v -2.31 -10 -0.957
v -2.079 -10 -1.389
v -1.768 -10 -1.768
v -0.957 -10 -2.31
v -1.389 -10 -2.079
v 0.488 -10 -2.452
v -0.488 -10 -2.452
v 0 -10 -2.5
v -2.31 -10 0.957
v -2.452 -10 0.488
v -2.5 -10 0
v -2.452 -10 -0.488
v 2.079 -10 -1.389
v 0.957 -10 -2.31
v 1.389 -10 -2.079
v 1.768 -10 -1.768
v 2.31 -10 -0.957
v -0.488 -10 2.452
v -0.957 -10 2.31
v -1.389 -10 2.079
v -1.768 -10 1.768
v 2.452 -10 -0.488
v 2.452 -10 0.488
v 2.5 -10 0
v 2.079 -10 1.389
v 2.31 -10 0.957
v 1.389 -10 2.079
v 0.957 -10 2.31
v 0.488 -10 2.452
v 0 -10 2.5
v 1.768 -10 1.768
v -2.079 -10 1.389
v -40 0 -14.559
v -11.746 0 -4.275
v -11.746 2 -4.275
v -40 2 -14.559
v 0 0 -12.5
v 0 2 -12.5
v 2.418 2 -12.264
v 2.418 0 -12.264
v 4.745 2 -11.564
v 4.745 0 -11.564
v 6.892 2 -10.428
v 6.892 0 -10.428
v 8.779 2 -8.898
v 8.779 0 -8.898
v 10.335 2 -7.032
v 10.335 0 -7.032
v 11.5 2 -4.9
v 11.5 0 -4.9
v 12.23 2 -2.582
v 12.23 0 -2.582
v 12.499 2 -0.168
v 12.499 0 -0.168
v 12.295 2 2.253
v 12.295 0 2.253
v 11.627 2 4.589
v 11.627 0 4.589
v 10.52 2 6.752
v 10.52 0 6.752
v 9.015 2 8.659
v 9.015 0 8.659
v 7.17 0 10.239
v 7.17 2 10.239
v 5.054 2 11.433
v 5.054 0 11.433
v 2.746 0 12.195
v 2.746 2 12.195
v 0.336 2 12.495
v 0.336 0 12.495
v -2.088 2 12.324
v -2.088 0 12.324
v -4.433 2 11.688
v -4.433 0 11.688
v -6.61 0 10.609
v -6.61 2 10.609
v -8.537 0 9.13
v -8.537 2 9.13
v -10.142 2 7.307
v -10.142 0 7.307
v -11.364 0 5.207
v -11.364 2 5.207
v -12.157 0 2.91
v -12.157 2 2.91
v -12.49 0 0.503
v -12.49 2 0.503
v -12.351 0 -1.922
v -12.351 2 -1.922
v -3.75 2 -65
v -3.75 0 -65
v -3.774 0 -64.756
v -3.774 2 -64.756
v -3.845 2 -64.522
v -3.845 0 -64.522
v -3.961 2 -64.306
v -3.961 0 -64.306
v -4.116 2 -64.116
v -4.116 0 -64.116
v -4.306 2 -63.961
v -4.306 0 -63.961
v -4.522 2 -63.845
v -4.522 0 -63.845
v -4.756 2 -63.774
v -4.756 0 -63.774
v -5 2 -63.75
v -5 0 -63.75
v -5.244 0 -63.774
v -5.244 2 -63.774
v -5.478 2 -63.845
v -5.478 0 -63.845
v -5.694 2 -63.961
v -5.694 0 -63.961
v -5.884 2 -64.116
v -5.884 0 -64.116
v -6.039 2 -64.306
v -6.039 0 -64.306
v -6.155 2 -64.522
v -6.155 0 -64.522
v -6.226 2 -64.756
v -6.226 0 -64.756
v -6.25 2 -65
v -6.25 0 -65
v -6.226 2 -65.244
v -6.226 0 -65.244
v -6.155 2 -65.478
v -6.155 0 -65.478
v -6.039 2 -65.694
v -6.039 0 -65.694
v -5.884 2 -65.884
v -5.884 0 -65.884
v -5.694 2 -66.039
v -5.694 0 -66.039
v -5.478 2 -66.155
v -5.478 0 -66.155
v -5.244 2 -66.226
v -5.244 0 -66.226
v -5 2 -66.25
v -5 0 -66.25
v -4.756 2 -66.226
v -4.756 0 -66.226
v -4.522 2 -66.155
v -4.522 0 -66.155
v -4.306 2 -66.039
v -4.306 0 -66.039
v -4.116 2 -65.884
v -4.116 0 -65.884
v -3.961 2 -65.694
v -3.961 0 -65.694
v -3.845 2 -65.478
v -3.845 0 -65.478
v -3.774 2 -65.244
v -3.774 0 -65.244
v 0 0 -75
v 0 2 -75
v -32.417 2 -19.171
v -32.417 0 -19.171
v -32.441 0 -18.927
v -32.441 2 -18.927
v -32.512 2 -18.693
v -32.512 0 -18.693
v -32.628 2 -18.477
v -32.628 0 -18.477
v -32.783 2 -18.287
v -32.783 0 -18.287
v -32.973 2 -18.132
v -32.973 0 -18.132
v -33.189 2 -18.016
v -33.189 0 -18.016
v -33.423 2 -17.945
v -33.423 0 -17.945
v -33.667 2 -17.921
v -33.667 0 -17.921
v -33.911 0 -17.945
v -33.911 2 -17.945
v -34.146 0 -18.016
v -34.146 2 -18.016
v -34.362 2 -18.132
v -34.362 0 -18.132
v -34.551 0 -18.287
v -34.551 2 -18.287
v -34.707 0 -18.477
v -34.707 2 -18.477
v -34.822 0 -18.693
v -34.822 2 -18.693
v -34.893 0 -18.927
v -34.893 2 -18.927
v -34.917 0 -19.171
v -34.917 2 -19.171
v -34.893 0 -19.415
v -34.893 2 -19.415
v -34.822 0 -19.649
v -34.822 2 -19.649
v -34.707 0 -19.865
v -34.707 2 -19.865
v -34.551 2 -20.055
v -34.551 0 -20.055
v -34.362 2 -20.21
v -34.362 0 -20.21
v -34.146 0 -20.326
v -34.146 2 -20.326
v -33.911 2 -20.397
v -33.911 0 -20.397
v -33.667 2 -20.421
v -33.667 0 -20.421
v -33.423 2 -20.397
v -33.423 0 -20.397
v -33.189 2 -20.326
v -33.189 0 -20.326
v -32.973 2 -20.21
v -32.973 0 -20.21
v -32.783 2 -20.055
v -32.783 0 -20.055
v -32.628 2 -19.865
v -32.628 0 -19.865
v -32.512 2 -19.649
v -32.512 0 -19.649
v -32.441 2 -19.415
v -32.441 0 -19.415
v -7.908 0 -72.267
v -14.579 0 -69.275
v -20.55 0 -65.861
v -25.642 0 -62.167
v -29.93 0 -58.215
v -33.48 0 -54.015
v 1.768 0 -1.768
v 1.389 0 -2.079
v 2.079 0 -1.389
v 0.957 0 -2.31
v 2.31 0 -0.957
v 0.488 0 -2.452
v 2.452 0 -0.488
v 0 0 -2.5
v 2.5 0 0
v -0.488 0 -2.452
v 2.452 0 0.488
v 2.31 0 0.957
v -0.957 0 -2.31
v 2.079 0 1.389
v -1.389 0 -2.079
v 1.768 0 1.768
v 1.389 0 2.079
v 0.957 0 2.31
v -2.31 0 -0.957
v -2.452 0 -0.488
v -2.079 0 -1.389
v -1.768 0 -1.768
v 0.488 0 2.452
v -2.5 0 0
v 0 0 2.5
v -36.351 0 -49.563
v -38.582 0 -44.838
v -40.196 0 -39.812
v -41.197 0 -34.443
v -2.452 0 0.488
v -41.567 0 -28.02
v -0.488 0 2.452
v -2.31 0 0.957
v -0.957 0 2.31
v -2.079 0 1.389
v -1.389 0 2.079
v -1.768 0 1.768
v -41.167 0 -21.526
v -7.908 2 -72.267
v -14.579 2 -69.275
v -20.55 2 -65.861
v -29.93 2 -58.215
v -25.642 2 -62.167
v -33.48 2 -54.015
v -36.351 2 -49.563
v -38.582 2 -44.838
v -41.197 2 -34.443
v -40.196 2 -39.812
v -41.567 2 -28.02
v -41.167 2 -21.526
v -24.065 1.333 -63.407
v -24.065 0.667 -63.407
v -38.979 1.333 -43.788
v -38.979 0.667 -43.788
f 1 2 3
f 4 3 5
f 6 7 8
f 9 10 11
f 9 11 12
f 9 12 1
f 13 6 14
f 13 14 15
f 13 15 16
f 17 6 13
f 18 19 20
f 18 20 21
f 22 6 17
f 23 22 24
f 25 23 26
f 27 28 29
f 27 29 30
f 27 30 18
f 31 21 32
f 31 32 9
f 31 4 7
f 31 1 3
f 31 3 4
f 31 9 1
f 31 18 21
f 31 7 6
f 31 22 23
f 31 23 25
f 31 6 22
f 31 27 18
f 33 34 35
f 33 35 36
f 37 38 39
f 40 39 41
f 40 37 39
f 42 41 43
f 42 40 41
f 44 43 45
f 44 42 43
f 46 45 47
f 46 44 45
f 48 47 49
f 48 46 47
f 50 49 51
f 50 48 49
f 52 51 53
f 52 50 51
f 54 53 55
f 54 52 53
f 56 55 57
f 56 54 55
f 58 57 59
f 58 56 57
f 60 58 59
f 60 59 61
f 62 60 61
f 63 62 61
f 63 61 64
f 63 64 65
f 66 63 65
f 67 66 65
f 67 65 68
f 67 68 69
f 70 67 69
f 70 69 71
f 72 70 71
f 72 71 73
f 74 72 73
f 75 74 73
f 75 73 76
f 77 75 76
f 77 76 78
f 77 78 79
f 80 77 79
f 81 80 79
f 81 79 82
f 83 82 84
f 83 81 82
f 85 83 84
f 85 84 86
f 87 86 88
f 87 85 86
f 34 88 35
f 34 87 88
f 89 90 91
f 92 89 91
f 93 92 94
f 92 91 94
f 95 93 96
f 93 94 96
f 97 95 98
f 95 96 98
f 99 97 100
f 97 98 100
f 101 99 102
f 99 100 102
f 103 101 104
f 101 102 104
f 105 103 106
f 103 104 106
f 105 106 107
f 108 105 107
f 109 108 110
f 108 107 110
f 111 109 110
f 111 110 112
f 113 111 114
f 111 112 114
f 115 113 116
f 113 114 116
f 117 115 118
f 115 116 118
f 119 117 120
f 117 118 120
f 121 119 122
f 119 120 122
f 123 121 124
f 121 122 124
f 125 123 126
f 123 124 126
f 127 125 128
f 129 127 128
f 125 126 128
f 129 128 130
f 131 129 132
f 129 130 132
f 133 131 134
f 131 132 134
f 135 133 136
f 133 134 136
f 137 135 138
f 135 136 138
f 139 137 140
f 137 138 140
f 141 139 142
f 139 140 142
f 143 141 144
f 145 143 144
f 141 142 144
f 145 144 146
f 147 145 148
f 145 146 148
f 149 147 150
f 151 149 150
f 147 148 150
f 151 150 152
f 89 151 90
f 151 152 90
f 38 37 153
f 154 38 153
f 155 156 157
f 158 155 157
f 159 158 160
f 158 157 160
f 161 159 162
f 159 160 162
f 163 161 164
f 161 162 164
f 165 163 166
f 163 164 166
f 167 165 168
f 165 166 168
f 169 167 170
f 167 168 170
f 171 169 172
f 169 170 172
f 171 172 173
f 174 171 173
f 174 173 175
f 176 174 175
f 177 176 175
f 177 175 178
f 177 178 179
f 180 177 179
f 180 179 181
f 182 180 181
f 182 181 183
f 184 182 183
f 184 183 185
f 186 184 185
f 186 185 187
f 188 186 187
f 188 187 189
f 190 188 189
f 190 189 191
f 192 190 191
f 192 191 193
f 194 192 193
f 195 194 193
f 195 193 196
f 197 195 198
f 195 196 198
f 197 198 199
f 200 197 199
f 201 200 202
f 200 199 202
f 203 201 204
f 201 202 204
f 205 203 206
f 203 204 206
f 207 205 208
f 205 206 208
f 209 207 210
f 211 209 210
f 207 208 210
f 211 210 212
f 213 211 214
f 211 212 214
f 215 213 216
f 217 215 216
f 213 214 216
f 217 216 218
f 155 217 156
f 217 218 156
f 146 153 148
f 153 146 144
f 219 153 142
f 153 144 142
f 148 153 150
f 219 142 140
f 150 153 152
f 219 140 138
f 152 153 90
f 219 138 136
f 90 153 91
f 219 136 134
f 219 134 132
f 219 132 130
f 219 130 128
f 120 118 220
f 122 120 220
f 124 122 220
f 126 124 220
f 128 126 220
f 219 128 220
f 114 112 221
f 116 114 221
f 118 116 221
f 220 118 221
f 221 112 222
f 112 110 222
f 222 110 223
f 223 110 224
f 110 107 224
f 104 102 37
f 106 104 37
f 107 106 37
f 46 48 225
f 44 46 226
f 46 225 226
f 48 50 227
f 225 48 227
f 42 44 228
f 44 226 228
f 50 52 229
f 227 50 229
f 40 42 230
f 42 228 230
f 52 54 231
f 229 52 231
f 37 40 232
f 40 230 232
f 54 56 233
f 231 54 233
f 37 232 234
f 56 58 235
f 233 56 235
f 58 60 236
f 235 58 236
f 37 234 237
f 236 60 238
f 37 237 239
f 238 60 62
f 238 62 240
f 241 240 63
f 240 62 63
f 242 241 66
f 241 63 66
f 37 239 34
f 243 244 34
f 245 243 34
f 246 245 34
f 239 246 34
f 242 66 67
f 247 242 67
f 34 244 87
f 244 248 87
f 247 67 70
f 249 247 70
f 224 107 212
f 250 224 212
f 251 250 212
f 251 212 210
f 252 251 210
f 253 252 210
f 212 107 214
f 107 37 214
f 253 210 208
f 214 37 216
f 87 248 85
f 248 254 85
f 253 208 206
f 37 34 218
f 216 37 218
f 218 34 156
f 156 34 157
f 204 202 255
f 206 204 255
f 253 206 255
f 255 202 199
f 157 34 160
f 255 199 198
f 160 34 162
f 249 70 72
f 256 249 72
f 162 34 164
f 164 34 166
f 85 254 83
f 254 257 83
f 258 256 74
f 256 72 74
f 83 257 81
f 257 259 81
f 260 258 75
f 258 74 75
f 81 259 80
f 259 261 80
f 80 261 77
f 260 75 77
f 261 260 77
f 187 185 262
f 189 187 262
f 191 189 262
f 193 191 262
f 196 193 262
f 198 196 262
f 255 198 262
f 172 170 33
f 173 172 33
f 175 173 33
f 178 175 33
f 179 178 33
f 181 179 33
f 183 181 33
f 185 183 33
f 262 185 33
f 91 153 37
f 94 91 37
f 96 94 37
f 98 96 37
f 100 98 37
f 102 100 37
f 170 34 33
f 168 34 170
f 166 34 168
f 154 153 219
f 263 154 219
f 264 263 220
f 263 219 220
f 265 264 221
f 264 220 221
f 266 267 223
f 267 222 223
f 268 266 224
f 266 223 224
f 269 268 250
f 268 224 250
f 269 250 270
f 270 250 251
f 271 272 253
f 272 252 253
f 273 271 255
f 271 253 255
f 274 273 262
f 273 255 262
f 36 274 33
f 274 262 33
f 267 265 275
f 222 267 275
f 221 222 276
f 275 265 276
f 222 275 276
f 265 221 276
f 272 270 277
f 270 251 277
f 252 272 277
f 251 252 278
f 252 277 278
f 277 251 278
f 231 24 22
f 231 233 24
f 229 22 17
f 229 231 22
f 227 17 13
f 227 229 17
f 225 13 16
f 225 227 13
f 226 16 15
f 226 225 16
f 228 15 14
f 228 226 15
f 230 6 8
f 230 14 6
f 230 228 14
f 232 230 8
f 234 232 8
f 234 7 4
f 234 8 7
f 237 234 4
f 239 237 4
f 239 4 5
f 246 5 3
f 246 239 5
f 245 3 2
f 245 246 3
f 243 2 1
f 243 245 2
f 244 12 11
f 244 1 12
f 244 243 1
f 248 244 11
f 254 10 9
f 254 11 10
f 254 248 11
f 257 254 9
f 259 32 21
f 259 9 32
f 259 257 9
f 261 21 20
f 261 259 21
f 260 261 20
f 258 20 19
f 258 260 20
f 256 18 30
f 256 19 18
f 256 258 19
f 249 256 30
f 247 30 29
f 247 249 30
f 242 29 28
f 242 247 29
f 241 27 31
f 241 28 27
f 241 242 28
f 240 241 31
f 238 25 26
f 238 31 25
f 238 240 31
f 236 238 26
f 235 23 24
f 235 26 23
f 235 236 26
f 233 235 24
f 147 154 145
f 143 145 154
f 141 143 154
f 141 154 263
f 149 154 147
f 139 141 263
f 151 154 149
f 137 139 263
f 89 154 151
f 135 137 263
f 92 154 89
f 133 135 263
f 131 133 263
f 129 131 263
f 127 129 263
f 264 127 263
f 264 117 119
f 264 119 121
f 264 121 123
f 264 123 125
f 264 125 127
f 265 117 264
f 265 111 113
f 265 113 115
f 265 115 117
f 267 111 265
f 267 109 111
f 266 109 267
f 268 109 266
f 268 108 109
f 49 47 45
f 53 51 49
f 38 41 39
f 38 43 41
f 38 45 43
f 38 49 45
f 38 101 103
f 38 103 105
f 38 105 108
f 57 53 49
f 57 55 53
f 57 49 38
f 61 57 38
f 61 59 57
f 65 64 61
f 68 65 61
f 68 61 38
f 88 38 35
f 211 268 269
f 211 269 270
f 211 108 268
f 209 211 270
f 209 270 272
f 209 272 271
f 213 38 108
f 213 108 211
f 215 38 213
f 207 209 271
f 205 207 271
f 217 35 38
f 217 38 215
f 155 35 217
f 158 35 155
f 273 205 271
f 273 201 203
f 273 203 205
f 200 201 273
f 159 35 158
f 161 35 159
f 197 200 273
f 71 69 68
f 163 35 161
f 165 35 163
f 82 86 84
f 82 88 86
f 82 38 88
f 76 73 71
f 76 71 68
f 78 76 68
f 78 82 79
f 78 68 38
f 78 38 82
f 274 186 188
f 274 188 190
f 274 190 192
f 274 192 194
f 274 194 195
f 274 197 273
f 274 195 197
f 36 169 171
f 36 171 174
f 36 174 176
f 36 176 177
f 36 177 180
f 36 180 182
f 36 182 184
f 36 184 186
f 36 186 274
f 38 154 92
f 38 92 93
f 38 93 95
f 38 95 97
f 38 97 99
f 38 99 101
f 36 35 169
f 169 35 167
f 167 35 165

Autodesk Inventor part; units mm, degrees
ref_plane "YZ Plane" through (0, 0, 0) normal (1, 0, 0) x (0, 1, 0)
ref_plane "XZ Plane" through (0, 0, 0) normal (0, 1, 0) x (-1, 0, 0)
ref_plane "XY Plane" through (0, 0, 0) normal (0, 0, 1) x (1, 0, 0)
sketch "Sketch1" plane through (0, 0, 0) normal (0, 1, 0) x (-1, 0, 0)
  circle A0 centre (0, 0) radius 12.5
  line L0 (11.7462, -4.2753) -> (40, -14.5588)
  line L1 (0, 0) -> (41.7481, 0) construction
  line L2 (0, 0) -> (11.7462, -4.2753) construction
  line L3 (0, 0) -> (0, -75)
  line L4 (0, -75) -> (27.0598, -66.8927) construction
  line L5 (27.0598, -66.8927) -> (47.507, -49.1207) construction
  line L6 (47.507, -49.1207) -> (40, -14.5588) construction
  spline S0 degree 3 poles (0, -75) (27.0598, -66.8927) (47.507, -49.1207) (40, -14.5588) knots 1 1 1 1 2 2 2 2
  point P0 (0, -12.5)
  dimension "d0" = 25
  dimension "d1" = 40
  dimension "d3" = 20
  dimension "d4" = 75
extrude "Extrusion1" add sketch "Sketch1" along normal blind 2
sketch "Sketch2" plane through (0, 0, 0) normal (0, -1, 0) x (1, 0, 0)
  circle A0 centre (0, 0) radius 2.5
  dimension "d7" = 5
extrude "Extrusion2" add sketch "Sketch2" along normal blind 10
sketch "Sketch4" plane through (0, 0, 0) normal (0, -1, 0) x (1, 0, 0)
  circle A0 centre (-33.6672, -19.171) radius 1.25 projected
  circle A1 centre (-5, -65) radius 1.25 projected
  point P0 (0, 0)
extrude "Extrusion4" cut sketch "Sketch4" against normal up to surface (2 mm away)
properties part number "clamshell half" material "ABS Plastic"
